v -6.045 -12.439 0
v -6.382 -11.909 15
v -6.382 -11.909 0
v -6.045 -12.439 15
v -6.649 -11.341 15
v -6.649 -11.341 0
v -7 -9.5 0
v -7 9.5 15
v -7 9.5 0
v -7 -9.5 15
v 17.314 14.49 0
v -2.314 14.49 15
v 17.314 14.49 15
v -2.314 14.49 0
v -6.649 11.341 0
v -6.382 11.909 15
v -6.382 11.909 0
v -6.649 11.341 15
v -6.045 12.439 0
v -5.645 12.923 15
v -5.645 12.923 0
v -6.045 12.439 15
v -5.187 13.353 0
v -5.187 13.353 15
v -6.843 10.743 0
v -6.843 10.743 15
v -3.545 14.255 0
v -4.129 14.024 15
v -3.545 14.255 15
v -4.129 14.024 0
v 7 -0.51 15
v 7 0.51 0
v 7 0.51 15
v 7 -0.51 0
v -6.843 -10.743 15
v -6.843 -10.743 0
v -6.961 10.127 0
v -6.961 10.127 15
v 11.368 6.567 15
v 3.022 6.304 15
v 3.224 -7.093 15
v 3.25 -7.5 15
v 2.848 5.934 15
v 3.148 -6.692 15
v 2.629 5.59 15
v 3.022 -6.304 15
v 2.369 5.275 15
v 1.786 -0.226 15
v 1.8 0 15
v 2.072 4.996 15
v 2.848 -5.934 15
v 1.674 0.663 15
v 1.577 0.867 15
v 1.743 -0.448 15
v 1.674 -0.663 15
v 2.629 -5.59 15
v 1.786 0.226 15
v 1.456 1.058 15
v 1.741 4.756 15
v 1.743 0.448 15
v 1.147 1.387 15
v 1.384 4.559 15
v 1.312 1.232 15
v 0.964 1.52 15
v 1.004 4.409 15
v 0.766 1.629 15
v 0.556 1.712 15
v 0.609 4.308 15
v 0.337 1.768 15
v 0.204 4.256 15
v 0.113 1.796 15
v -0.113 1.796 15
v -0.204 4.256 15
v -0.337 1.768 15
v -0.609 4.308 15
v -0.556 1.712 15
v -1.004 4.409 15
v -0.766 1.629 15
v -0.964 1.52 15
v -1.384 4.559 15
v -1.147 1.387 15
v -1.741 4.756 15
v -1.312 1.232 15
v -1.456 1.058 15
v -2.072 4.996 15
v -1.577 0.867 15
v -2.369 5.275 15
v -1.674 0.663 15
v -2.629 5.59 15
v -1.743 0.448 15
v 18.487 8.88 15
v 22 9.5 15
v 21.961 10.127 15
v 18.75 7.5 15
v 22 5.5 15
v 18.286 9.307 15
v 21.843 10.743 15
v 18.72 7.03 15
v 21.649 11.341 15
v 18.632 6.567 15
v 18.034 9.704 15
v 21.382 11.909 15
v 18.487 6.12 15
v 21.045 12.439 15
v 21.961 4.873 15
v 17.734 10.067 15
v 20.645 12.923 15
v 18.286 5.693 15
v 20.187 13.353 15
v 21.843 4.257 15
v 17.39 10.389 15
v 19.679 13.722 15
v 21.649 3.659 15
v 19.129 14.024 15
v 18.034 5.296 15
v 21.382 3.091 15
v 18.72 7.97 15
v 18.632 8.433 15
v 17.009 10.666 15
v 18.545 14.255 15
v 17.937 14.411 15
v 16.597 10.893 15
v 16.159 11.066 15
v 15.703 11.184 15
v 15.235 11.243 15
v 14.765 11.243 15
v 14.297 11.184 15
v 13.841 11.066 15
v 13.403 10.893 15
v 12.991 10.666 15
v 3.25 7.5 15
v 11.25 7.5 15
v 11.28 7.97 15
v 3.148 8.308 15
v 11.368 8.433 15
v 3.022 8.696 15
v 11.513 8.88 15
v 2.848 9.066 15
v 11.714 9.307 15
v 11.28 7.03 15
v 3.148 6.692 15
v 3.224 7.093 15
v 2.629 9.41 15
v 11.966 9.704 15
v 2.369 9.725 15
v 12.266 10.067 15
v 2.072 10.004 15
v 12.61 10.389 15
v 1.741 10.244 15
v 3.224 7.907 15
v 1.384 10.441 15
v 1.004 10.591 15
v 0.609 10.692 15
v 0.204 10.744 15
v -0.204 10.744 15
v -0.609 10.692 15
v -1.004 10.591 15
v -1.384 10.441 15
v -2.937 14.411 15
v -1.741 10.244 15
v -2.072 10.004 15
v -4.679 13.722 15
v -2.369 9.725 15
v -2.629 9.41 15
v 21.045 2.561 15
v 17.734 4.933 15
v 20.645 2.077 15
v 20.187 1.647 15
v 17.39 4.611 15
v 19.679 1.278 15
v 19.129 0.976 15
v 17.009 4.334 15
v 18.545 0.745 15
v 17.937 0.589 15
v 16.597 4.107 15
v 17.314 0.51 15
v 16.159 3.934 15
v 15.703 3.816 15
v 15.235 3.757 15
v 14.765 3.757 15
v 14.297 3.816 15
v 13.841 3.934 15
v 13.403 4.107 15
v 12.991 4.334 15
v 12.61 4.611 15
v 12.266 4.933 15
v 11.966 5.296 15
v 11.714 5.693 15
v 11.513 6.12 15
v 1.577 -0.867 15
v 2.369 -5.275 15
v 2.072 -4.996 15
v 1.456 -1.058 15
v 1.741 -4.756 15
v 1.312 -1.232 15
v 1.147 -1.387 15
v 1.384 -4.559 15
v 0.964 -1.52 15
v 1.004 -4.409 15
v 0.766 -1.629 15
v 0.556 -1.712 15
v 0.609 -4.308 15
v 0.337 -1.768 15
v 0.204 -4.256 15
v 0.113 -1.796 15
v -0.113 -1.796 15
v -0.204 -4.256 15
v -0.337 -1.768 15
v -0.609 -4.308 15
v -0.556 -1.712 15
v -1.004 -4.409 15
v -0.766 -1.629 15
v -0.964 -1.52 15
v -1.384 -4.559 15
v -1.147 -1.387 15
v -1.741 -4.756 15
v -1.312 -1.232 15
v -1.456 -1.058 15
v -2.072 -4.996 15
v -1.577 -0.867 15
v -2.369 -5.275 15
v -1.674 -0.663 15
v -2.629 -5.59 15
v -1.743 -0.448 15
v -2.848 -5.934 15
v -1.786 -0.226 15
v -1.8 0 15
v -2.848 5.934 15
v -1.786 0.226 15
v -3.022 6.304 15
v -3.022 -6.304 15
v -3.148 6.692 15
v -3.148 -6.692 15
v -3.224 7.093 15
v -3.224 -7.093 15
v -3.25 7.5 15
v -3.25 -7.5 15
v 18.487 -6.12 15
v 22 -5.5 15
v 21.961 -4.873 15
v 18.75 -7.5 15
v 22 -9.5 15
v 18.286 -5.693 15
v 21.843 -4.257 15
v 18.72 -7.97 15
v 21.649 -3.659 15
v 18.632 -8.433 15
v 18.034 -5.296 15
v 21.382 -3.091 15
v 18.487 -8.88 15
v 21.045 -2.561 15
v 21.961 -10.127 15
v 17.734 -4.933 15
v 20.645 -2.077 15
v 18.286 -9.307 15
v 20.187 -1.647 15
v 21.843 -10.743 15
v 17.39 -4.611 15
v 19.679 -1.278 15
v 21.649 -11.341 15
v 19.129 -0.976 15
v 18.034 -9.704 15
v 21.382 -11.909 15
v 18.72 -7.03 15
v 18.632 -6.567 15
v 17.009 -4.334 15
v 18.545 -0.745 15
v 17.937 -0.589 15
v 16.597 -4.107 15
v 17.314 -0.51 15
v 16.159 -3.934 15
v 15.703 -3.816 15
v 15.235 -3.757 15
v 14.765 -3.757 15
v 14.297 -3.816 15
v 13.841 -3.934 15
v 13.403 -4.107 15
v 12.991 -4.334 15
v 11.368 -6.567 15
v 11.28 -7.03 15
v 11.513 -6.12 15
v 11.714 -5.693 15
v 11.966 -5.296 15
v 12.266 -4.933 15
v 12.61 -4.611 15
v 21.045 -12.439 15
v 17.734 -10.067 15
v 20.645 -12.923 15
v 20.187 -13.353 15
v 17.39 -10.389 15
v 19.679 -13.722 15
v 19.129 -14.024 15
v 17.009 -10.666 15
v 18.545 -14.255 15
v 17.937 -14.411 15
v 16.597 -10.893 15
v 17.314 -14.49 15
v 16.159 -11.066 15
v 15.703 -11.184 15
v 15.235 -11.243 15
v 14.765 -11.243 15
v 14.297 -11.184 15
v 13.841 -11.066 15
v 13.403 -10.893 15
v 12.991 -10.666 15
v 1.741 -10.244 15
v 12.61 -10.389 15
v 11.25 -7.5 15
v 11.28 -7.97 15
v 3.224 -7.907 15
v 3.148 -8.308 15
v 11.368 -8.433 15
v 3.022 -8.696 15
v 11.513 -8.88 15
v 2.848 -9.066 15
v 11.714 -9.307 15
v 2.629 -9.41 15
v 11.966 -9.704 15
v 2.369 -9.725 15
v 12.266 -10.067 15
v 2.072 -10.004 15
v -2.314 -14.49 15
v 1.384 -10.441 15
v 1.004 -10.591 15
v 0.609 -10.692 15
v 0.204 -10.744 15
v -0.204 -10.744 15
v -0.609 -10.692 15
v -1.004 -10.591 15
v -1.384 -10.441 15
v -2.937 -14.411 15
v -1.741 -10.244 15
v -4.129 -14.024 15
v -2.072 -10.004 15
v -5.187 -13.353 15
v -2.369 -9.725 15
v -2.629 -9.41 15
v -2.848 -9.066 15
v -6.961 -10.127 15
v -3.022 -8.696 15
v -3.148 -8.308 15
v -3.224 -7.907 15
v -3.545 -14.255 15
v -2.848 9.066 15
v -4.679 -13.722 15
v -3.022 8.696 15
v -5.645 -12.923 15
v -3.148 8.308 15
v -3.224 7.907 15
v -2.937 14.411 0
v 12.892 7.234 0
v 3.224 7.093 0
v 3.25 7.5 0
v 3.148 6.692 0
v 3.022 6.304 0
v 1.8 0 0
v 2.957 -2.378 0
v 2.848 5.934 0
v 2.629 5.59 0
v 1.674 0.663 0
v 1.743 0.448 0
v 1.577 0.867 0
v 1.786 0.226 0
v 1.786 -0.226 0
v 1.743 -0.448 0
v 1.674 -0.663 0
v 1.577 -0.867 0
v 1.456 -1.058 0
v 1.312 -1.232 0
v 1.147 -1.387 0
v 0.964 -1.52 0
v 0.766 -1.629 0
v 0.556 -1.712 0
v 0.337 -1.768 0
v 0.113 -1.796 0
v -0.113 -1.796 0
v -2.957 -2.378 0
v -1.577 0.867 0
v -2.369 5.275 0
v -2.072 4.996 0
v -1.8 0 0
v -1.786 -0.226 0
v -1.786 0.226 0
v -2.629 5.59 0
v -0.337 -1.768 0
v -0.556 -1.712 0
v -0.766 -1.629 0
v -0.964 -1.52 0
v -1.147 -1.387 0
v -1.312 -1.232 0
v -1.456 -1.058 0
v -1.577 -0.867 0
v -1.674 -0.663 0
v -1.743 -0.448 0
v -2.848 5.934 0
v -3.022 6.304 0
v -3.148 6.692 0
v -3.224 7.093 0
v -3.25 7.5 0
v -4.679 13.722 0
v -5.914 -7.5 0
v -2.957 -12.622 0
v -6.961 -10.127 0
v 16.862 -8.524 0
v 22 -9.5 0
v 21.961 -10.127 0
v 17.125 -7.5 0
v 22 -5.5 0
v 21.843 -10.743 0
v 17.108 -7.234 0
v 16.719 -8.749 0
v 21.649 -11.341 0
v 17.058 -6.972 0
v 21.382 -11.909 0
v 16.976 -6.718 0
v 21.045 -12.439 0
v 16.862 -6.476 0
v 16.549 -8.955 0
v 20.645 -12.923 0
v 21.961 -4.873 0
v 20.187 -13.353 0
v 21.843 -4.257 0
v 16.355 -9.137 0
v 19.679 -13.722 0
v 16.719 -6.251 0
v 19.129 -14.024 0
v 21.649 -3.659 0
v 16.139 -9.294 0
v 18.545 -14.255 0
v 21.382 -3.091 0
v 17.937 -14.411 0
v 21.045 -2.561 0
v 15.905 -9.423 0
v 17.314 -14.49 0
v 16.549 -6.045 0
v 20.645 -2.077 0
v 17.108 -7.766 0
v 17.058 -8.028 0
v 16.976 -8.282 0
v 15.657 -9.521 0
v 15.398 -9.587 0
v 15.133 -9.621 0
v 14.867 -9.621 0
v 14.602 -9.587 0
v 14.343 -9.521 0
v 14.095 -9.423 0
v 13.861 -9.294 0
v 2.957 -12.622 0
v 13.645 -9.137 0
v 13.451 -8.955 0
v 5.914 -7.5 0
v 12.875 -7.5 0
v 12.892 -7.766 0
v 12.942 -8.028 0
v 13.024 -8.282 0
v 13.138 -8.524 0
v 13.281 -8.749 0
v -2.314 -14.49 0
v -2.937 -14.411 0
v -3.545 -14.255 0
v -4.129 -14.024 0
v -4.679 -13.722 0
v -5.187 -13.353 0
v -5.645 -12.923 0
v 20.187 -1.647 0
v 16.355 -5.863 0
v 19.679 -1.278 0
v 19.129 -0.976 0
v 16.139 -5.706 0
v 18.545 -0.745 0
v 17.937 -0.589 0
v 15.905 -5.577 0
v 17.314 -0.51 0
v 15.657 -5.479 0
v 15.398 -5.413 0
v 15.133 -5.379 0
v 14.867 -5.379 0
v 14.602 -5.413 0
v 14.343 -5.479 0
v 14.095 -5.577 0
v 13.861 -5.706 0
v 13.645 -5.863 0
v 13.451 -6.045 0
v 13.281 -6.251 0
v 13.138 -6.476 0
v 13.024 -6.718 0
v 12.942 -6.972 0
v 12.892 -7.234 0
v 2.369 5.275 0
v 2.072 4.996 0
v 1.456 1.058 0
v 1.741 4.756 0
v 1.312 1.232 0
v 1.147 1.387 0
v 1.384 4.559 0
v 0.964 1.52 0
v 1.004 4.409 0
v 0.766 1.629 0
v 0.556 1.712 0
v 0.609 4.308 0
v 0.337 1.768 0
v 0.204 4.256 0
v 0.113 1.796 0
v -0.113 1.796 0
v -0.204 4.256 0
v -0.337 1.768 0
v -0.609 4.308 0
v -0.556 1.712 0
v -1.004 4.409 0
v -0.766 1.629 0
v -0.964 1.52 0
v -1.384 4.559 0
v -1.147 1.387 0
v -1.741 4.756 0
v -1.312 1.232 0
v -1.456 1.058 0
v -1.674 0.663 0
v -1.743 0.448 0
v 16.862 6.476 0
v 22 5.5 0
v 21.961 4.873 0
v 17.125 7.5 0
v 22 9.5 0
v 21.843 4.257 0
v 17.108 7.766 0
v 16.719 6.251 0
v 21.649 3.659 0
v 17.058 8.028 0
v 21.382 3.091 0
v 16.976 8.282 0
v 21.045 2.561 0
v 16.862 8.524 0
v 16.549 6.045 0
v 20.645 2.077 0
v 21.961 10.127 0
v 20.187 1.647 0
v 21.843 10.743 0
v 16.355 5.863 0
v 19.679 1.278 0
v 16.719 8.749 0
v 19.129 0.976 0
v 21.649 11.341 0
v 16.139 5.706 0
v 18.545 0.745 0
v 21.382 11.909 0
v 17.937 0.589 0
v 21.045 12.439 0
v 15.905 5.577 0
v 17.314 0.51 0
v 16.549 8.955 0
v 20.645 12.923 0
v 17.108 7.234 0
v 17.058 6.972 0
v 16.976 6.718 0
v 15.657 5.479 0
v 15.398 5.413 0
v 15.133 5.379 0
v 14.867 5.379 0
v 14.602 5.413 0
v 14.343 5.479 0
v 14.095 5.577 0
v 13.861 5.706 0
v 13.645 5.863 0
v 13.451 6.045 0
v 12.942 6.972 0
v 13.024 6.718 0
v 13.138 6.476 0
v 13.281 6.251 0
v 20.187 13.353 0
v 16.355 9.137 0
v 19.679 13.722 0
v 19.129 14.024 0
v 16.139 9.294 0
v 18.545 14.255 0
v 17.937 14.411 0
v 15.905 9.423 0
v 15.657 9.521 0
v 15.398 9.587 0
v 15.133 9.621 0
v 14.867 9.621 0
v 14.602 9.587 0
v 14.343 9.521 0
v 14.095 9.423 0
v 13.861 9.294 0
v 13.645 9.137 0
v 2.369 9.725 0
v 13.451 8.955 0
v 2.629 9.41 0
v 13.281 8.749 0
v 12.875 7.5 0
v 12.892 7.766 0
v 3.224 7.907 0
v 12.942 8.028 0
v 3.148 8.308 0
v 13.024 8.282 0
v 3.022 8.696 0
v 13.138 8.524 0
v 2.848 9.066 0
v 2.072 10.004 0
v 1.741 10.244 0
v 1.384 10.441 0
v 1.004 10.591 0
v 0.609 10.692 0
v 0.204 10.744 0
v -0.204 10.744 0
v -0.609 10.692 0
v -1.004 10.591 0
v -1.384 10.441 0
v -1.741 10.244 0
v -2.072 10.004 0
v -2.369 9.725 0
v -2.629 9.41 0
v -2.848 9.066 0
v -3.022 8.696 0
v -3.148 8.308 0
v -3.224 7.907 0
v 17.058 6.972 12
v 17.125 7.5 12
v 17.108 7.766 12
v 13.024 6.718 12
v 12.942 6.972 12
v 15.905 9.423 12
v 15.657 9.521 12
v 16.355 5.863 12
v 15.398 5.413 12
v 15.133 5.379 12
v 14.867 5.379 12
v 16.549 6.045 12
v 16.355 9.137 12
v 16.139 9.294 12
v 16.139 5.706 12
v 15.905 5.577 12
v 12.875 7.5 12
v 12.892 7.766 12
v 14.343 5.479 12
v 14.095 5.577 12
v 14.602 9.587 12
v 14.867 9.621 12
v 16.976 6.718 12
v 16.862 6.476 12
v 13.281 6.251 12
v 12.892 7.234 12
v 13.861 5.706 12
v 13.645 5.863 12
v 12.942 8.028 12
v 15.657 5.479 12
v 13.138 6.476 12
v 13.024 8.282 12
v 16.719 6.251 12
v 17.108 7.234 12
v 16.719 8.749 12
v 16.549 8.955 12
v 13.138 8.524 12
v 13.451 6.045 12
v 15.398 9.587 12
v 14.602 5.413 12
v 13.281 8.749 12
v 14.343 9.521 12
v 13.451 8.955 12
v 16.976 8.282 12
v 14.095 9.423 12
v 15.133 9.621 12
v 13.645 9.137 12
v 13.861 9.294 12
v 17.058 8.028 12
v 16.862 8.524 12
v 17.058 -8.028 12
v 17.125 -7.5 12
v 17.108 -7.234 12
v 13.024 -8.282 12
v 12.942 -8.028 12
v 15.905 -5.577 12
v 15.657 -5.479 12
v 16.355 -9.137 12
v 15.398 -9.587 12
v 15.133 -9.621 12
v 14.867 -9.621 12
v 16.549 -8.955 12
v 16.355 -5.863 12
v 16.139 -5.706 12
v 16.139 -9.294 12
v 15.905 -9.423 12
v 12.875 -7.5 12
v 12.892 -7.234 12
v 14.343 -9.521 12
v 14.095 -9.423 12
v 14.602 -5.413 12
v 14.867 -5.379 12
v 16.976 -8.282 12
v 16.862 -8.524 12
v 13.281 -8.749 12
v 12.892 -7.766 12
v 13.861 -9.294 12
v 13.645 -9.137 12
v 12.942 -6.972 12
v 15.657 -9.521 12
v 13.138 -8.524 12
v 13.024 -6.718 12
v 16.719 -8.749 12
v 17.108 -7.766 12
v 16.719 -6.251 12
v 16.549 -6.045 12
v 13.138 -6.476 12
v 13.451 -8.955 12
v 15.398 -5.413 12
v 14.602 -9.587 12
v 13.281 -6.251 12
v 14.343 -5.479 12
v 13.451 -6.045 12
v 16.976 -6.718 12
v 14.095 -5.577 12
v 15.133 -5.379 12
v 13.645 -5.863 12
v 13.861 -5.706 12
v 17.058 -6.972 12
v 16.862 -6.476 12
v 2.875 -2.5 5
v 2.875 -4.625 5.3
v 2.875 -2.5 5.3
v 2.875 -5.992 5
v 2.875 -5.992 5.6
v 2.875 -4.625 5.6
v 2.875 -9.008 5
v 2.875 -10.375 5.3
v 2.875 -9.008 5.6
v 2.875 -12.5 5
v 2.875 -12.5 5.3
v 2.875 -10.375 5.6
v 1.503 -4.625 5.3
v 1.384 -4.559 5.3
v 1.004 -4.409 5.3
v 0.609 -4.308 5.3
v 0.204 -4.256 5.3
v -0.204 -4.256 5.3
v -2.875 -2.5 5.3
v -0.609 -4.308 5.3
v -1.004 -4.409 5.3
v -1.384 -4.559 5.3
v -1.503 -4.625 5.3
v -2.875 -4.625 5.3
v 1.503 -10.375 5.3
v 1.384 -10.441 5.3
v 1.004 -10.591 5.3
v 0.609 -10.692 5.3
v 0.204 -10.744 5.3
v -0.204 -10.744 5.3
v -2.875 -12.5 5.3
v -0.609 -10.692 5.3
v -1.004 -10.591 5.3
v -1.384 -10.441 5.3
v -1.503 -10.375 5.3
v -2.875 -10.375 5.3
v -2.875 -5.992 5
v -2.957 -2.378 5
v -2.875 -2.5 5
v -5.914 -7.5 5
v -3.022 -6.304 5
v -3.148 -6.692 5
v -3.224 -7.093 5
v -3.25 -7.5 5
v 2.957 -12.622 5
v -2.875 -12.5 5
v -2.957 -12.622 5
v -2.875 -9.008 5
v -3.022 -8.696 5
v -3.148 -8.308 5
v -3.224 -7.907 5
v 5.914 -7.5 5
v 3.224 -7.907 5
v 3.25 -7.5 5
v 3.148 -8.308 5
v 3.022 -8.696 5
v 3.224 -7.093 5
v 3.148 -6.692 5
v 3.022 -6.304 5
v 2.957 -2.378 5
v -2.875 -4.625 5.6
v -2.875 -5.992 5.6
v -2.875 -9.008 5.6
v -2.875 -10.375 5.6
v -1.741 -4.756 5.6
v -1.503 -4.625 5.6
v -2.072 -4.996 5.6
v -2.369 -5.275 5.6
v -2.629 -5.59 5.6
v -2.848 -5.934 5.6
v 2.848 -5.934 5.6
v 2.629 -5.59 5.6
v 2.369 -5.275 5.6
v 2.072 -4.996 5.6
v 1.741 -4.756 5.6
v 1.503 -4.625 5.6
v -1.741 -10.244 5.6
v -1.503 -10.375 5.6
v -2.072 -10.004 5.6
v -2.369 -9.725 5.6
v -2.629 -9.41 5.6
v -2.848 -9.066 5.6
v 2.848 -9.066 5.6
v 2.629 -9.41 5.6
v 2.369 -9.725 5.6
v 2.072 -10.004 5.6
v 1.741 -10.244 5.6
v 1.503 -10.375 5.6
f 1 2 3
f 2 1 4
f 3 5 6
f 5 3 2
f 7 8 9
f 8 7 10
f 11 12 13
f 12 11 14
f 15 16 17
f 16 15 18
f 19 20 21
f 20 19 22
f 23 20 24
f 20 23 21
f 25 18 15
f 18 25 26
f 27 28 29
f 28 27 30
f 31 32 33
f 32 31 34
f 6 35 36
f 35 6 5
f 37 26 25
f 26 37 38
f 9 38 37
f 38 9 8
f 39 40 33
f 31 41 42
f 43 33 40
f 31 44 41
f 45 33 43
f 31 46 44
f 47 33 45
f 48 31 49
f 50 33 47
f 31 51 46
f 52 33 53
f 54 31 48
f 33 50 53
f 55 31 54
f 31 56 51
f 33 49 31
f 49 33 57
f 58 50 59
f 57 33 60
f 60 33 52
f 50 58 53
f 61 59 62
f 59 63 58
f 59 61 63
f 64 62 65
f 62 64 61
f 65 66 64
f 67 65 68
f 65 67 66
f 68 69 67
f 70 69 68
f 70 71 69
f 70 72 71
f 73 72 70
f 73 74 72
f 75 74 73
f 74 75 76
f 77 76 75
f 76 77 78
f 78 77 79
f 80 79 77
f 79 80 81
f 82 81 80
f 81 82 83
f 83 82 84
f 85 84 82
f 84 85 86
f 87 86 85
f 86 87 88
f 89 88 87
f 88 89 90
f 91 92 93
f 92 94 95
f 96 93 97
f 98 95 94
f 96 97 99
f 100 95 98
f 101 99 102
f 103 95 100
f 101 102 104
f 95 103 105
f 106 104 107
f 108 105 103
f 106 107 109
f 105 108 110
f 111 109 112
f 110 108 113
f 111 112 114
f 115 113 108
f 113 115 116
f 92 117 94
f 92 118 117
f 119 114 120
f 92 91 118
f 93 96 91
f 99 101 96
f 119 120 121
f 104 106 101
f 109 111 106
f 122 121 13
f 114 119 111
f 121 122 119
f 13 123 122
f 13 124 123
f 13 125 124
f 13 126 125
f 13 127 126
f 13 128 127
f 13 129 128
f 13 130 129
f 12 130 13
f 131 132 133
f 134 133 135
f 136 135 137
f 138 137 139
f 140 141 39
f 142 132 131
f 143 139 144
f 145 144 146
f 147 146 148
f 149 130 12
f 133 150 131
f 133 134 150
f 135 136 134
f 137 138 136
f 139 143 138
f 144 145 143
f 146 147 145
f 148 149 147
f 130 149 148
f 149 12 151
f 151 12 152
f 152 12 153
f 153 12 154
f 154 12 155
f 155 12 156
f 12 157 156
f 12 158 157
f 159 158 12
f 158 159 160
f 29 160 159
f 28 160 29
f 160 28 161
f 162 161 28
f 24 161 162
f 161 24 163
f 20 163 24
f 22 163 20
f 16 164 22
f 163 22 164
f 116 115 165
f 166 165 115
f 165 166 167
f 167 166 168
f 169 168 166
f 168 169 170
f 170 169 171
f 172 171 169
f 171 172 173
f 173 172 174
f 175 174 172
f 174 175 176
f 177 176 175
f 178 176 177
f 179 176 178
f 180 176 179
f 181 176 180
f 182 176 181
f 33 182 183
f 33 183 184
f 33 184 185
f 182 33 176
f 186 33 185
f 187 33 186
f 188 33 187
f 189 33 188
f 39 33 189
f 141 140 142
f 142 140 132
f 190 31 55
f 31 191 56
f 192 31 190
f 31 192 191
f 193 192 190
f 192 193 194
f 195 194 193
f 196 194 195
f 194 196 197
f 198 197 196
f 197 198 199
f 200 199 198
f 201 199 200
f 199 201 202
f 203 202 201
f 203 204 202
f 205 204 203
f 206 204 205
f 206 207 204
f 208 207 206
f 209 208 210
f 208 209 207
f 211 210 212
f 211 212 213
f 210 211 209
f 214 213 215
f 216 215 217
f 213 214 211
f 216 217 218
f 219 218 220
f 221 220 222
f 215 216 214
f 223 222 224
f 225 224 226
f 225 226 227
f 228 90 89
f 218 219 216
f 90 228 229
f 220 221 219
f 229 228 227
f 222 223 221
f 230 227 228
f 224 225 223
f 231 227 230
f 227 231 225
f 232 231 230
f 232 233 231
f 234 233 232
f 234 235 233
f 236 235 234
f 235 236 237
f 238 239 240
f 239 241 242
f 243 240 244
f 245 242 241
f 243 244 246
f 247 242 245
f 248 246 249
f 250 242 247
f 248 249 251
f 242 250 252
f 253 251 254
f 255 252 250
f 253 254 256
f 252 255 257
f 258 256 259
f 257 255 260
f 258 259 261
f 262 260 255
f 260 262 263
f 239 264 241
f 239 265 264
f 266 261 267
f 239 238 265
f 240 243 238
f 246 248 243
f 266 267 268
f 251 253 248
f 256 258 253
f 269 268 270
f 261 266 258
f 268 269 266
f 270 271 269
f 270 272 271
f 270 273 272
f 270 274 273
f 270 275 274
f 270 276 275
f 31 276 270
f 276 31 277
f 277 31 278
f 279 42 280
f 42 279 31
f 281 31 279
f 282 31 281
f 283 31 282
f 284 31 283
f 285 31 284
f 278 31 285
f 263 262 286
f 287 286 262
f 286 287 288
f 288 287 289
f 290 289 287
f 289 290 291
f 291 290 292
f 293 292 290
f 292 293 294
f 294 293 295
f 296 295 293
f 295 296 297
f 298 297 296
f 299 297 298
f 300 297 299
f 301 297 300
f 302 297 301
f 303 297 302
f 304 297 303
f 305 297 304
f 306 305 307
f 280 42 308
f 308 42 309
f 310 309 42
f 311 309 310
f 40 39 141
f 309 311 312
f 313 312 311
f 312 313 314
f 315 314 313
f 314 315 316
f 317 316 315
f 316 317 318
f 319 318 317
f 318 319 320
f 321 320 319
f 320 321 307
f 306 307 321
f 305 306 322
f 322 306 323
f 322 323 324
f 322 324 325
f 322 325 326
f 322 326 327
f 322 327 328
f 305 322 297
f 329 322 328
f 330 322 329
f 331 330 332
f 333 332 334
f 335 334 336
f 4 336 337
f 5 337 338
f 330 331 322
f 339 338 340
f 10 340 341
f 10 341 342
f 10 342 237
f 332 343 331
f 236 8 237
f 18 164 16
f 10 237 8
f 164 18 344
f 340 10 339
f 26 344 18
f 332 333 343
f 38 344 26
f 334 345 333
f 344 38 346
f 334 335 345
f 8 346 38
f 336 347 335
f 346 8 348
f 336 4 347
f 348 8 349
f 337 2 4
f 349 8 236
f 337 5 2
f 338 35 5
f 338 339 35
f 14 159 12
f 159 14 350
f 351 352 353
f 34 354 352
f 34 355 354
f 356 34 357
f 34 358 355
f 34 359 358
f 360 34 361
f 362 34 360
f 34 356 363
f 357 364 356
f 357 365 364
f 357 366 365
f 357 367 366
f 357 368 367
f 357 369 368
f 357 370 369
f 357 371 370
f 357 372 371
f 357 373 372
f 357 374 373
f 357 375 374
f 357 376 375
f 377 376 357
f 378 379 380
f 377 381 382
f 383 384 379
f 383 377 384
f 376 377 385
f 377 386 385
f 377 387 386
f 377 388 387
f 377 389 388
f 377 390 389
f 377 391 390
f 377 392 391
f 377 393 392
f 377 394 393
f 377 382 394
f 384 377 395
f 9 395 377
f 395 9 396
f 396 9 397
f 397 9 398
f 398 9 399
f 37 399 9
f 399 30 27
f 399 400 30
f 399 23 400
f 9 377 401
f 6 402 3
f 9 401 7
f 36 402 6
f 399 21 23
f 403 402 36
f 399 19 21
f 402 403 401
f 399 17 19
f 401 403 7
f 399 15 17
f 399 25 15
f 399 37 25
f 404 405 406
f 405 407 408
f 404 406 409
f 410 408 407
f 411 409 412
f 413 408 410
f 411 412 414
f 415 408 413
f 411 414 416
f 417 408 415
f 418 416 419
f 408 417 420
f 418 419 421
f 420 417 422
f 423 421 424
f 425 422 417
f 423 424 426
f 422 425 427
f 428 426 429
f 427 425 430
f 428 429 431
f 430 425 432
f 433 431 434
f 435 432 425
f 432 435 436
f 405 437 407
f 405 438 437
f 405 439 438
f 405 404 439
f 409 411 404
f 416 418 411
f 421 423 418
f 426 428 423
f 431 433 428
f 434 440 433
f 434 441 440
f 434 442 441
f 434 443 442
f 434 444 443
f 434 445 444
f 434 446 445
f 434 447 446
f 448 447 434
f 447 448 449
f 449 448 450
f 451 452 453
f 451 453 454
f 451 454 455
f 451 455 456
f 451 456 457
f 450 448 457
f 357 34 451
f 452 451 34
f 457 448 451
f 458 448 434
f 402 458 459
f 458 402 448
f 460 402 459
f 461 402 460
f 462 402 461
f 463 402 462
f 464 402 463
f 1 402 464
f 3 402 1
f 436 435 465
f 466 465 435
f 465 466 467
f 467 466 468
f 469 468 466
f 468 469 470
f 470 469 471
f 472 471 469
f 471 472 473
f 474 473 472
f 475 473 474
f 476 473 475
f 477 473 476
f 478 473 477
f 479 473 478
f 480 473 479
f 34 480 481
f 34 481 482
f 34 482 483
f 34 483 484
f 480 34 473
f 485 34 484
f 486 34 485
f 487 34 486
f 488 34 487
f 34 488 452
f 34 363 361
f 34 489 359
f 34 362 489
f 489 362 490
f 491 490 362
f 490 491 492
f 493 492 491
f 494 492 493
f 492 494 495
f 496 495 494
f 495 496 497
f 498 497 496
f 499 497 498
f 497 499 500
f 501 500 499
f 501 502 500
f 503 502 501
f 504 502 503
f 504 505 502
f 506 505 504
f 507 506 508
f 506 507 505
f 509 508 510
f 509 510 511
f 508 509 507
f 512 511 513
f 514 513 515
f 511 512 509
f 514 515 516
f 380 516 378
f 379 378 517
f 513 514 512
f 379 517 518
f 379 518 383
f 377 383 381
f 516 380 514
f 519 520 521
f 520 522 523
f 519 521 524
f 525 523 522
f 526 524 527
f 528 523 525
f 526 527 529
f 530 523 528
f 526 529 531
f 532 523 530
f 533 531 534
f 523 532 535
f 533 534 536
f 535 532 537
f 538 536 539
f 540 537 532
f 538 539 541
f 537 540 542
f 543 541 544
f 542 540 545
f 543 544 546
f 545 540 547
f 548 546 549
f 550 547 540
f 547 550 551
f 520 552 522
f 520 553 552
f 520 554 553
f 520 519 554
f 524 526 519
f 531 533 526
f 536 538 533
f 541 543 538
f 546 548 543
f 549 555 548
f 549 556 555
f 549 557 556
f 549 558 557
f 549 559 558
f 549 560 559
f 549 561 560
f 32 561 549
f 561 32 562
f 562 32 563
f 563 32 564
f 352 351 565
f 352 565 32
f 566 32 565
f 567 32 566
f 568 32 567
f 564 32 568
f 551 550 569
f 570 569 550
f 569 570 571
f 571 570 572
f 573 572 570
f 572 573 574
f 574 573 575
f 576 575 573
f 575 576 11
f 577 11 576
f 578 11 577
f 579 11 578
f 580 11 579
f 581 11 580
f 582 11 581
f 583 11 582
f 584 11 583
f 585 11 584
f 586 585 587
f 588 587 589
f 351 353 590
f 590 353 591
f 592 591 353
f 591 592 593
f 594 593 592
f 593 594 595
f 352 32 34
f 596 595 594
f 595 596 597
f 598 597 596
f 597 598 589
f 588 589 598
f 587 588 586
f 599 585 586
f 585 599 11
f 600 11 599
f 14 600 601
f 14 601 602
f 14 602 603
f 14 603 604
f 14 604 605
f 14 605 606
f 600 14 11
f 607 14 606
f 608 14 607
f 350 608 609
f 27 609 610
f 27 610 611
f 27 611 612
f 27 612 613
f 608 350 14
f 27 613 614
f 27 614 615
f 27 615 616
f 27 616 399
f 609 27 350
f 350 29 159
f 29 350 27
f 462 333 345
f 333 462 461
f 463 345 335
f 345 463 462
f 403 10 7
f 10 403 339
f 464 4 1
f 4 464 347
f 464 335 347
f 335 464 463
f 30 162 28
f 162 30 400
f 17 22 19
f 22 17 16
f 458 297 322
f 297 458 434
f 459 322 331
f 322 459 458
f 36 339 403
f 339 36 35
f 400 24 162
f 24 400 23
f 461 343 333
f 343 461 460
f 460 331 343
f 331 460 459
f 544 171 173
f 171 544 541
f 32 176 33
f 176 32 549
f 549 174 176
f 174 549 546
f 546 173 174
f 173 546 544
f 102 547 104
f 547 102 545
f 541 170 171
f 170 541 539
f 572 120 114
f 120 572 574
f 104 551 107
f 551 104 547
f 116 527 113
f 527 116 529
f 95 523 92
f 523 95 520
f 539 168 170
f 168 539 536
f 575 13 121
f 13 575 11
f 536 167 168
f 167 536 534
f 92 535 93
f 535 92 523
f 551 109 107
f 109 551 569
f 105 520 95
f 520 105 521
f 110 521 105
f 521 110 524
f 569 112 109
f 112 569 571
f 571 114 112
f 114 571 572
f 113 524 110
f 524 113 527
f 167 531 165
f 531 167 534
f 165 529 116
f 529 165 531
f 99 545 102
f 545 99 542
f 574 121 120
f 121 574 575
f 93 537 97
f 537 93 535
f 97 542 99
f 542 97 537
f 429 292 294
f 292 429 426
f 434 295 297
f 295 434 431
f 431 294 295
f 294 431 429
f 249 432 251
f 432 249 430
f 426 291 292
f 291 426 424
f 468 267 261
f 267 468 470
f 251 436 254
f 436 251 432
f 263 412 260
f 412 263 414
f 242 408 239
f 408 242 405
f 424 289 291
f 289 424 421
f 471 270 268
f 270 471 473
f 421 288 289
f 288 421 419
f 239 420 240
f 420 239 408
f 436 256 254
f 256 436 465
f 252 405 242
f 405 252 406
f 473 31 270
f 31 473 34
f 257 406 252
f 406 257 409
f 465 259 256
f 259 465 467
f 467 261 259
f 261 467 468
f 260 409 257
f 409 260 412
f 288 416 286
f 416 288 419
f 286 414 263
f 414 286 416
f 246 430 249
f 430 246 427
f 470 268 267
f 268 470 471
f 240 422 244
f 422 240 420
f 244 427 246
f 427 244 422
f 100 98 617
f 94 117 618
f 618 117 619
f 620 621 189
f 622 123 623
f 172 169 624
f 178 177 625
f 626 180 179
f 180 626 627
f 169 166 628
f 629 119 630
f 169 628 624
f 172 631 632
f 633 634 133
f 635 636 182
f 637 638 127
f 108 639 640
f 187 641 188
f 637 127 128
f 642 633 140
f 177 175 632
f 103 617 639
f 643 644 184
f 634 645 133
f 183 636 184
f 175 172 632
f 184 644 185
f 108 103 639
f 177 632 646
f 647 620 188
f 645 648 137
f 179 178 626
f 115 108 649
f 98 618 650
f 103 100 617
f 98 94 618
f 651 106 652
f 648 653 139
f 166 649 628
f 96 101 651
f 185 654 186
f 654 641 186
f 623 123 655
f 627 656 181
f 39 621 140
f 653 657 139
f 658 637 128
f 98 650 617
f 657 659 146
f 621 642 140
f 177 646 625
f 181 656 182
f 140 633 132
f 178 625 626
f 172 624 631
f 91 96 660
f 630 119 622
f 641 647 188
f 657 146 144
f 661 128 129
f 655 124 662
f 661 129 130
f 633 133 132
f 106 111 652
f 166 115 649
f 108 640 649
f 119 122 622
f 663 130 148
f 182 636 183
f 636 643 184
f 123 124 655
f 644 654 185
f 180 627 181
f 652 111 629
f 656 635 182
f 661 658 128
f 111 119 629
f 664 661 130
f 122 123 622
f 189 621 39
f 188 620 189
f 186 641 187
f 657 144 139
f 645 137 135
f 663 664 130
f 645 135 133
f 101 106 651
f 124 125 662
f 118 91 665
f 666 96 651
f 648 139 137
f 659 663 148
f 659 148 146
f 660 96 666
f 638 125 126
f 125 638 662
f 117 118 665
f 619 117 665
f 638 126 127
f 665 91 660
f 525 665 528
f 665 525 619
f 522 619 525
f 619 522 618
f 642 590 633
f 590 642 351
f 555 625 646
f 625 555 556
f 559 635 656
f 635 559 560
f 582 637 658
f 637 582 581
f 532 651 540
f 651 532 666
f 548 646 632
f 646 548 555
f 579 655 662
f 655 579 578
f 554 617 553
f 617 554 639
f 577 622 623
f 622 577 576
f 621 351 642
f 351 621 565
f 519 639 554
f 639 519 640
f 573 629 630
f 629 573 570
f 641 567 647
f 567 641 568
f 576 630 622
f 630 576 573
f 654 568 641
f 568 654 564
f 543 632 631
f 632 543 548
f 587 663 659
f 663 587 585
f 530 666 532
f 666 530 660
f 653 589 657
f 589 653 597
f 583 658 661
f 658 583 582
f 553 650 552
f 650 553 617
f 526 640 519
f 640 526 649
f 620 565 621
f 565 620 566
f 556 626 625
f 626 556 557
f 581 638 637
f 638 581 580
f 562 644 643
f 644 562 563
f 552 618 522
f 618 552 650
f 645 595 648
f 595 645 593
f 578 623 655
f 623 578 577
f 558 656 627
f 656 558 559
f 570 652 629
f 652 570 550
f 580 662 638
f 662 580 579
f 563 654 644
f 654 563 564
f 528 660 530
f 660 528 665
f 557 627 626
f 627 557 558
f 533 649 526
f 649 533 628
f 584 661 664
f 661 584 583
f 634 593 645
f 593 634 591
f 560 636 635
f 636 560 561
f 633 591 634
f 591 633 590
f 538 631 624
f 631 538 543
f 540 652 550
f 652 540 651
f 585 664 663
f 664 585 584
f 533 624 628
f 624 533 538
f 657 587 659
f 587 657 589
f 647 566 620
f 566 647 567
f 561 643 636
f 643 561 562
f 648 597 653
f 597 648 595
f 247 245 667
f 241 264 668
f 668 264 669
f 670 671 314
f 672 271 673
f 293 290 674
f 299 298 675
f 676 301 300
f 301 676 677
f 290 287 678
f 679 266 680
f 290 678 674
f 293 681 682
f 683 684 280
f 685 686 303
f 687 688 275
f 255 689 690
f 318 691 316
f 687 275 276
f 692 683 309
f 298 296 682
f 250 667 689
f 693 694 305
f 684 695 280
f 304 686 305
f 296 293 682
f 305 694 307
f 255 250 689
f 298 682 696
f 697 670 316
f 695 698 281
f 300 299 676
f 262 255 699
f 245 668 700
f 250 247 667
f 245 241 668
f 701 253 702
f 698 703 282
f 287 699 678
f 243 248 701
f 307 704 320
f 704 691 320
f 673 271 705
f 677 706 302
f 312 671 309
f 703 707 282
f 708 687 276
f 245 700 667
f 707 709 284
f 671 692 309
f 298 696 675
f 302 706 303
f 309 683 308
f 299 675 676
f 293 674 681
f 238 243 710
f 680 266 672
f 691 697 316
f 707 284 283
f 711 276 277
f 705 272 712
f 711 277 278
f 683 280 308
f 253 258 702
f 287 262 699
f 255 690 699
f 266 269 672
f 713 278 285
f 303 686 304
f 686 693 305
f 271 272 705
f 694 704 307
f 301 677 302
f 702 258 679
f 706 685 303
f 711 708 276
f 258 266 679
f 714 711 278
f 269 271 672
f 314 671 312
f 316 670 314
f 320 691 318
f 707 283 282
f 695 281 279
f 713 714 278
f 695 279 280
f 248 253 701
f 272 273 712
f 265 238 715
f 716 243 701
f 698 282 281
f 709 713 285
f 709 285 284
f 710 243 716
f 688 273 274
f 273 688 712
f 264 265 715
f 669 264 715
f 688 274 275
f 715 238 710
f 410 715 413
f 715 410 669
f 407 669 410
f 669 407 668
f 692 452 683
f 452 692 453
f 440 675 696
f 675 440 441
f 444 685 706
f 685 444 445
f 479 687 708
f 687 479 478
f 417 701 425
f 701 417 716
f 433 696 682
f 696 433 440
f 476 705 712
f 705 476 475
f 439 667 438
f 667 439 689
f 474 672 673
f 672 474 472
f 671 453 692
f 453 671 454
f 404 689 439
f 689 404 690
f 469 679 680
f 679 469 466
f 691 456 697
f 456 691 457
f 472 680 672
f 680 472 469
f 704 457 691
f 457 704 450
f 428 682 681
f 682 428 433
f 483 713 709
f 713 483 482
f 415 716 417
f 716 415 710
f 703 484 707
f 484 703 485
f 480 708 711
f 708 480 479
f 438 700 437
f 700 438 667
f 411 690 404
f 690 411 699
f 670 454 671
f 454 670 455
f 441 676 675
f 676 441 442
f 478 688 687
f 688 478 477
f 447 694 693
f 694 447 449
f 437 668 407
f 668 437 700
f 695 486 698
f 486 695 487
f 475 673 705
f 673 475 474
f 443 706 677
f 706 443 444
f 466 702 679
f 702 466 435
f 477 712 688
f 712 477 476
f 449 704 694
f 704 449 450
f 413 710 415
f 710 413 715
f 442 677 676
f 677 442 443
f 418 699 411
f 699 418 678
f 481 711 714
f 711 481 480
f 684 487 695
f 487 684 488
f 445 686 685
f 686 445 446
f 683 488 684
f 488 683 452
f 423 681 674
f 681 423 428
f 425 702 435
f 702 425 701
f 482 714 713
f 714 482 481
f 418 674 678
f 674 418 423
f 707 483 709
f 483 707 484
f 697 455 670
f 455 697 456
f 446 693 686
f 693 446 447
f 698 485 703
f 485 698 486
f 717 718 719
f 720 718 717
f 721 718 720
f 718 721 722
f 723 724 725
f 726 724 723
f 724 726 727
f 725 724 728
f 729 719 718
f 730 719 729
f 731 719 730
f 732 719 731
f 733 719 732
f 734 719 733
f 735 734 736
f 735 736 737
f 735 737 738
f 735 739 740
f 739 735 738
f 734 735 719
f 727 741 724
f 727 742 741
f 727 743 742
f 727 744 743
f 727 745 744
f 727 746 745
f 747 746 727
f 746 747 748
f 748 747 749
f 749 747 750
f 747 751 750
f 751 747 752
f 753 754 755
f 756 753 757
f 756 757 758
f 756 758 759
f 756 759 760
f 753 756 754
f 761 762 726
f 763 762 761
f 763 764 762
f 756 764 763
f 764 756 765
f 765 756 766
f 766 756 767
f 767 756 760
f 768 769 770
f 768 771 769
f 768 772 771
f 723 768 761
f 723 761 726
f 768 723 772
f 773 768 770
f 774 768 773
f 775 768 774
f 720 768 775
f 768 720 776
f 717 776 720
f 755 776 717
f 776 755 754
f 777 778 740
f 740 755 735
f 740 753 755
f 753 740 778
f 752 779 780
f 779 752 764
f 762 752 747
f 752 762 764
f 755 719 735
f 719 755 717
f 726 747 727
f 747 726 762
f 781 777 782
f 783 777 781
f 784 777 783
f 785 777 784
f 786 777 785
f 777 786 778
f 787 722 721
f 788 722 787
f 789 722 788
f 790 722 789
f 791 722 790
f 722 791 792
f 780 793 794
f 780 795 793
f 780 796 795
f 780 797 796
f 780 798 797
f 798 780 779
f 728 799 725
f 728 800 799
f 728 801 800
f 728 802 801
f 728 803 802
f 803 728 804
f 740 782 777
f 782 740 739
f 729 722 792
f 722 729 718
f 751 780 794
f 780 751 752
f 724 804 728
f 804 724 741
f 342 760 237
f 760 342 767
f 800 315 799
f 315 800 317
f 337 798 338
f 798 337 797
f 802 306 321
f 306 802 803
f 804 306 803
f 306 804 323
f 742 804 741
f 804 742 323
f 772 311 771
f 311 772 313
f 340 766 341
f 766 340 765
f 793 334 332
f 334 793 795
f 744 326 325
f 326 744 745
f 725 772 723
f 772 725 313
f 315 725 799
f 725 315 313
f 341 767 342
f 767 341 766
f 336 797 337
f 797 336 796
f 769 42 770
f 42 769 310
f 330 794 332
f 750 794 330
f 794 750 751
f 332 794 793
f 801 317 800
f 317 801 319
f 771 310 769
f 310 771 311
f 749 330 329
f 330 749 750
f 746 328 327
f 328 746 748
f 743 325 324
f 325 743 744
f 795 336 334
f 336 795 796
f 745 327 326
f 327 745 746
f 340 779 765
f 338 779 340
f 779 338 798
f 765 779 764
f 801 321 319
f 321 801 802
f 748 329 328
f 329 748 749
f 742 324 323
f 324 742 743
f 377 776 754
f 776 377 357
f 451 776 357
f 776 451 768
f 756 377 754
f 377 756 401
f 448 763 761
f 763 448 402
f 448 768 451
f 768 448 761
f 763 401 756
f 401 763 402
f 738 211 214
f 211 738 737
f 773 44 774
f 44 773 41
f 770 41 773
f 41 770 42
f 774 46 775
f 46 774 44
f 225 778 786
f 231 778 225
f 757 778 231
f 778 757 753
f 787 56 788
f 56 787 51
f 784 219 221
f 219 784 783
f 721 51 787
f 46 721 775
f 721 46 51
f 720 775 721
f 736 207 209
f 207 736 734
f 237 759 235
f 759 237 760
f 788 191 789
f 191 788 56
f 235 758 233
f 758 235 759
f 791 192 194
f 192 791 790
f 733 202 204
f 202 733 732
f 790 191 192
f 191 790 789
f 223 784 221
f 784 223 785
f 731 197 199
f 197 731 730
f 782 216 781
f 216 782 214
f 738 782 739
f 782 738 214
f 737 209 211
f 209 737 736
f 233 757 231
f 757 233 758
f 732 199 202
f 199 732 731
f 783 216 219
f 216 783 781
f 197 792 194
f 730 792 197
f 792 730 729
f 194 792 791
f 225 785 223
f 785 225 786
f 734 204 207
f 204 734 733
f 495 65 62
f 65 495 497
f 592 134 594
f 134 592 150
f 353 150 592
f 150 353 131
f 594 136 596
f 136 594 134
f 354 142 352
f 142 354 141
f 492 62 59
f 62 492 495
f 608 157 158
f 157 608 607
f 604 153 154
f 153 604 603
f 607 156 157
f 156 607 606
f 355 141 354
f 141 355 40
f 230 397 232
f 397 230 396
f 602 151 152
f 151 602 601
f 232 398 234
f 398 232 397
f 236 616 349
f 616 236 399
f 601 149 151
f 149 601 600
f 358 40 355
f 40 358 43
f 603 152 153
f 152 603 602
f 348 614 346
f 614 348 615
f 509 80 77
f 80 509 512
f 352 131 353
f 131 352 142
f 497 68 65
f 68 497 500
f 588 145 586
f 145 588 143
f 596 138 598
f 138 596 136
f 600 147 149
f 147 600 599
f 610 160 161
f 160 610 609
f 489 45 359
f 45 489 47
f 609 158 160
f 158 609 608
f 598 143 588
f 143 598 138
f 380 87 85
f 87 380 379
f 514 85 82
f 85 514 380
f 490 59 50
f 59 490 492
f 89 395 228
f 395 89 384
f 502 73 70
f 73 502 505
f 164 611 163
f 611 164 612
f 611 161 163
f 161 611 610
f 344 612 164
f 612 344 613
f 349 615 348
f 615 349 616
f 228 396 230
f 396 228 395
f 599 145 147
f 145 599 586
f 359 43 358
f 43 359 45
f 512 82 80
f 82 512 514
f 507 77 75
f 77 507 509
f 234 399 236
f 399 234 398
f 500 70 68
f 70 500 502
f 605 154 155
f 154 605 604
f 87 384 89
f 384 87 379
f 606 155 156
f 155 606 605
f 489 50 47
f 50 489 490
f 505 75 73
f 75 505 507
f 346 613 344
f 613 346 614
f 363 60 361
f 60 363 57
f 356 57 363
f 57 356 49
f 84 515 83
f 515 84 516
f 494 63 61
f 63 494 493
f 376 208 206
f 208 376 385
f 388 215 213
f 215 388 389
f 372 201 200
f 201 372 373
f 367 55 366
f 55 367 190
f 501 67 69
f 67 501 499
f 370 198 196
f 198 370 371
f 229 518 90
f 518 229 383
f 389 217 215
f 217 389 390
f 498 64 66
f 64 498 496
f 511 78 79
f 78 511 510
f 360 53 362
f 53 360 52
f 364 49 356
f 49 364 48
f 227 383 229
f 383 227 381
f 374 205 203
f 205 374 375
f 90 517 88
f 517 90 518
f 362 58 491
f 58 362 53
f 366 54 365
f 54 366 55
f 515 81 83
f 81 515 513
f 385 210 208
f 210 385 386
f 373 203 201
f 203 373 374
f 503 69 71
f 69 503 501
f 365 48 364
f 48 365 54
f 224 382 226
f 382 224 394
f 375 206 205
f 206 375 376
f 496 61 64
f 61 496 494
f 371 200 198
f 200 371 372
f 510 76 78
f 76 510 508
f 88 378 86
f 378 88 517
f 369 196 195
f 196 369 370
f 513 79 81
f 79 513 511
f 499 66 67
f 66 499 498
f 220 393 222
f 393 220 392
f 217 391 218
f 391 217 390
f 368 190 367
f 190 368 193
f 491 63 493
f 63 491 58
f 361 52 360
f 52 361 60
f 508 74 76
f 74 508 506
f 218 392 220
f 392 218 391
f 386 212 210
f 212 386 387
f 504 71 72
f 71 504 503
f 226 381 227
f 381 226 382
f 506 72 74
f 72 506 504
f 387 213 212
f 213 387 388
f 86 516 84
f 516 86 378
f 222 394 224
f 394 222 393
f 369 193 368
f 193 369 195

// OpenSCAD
$fn = 50;


difference() {
	union() {
		hull() {
			translate(v = [-2.0000000000, 9.5000000000, 0]) {
				cylinder(h = 15, r = 5);
			}
			translate(v = [2.0000000000, 9.5000000000, 0]) {
				cylinder(h = 15, r = 5);
			}
			translate(v = [-2.0000000000, -9.5000000000, 0]) {
				cylinder(h = 15, r = 5);
			}
			translate(v = [2.0000000000, -9.5000000000, 0]) {
				cylinder(h = 15, r = 5);
			}
		}
		translate(v = [7.5000000000, 7.5000000000, 0]) {
			hull() {
				translate(v = [-9.5000000000, 2.0000000000, 0]) {
					cylinder(h = 15, r = 5);
				}
				translate(v = [9.5000000000, 2.0000000000, 0]) {
					cylinder(h = 15, r = 5);
				}
				translate(v = [-9.5000000000, -2.0000000000, 0]) {
					cylinder(h = 15, r = 5);
				}
				translate(v = [9.5000000000, -2.0000000000, 0]) {
					cylinder(h = 15, r = 5);
				}
			}
		}
		translate(v = [7.5000000000, -7.5000000000, 0]) {
			hull() {
				translate(v = [-9.5000000000, 2.0000000000, 0]) {
					cylinder(h = 15, r = 5);
				}
				translate(v = [9.5000000000, 2.0000000000, 0]) {
					cylinder(h = 15, r = 5);
				}
				translate(v = [-9.5000000000, -2.0000000000, 0]) {
					cylinder(h = 15, r = 5);
				}
				translate(v = [9.5000000000, -2.0000000000, 0]) {
					cylinder(h = 15, r = 5);
				}
			}
		}
	}
	union() {
		translate(v = [15.0000000000, 7.5000000000, 15]) {
			rotate(a = [0, 0, 0]) {
				difference() {
					union() {
						#translate(v = [0, 0, -15.0000000000]) {
							cylinder(h = 15, r = 2.0000000000);
						}
						#translate(v = [0, 0, -3]) {
							cylinder(h = 3, r1 = 2.1250000000, r2 = 3.7500000000);
						}
						#translate(v = [0, 0, -15.0000000000]) {
							cylinder(h = 15, r = 2.1250000000);
						}
						#translate(v = [0, 0, -15.0000000000]) {
							cylinder(h = 15, r = 2.0000000000);
						}
					}
					union();
				}
			}
		}
		translate(v = [15.0000000000, -7.5000000000, 15]) {
			rotate(a = [0, 0, 0]) {
				difference() {
					union() {
						#translate(v = [0, 0, -15.0000000000]) {
							cylinder(h = 15, r = 2.0000000000);
						}
						#translate(v = [0, 0, -3]) {
							cylinder(h = 3, r1 = 2.1250000000, r2 = 3.7500000000);
						}
						#translate(v = [0, 0, -15.0000000000]) {
							cylinder(h = 15, r = 2.1250000000);
						}
						#translate(v = [0, 0, -15.0000000000]) {
							cylinder(h = 15, r = 2.0000000000);
						}
					}
					union();
				}
			}
		}
		translate(v = [0.0000000000, -7.5000000000, 0]) {
			rotate(a = [0, 0, 0]) {
				difference() {
					union() {
						#translate(v = [-2.8750000000, -5.0000000000, -0.3000000000]) {
							cube(size = [5.7500000000, 10, 0.3000000000]);
						}
						#translate(v = [-2.8750000000, -2.8750000000, -0.6000000000]) {
							cube(size = [5.7500000000, 5.7500000000, 0.3000000000]);
						}
						#translate(v = [-2.8750000000, -5.0000000000, 5]) {
							cube(size = [5.7500000000, 10, 0.3000000000]);
						}
						#translate(v = [-2.8750000000, -2.8750000000, 5.3000000000]) {
							cube(size = [5.7500000000, 5.7500000000, 0.3000000000]);
						}
						#translate(v = [0, 0, -100.0000000000]) {
							cylinder(h = 200, r = 3.2500000000);
						}
						#linear_extrude(height = 5) {
							polygon(points = [[5.9142500000, 0.0000000000], [2.9571250000, 5.1218907443], [-2.9571250000, 5.1218907443], [-5.9142500000, 0.0000000000], [-2.9571250000, -5.1218907443], [2.9571250000, -5.1218907443]]);
						}
						#translate(v = [-2.8750000000, -5.0000000000, -0.3000000000]) {
							cube(size = [5.7500000000, 10, 0.3000000000]);
						}
						#translate(v = [-2.8750000000, -2.8750000000, -0.6000000000]) {
							cube(size = [5.7500000000, 5.7500000000, 0.3000000000]);
						}
						#translate(v = [-2.8750000000, -5.0000000000, 5]) {
							cube(size = [5.7500000000, 10, 0.3000000000]);
						}
						#translate(v = [-2.8750000000, -2.8750000000, 5.3000000000]) {
							cube(size = [5.7500000000, 5.7500000000, 0.3000000000]);
						}
						#translate(v = [0, 0, -100.0000000000]) {
							cylinder(h = 200, r = 3.2500000000);
						}
						#translate(v = [-2.8750000000, -5.0000000000, -0.3000000000]) {
							cube(size = [5.7500000000, 10, 0.3000000000]);
						}
						#translate(v = [-2.8750000000, -2.8750000000, -0.6000000000]) {
							cube(size = [5.7500000000, 5.7500000000, 0.3000000000]);
						}
						#translate(v = [-2.8750000000, -5.0000000000, 5]) {
							cube(size = [5.7500000000, 10, 0.3000000000]);
						}
						#translate(v = [-2.8750000000, -2.8750000000, 5.3000000000]) {
							cube(size = [5.7500000000, 5.7500000000, 0.3000000000]);
						}
						#translate(v = [0, 0, -100.0000000000]) {
							cylinder(h = 200, r = 3.2500000000);
						}
					}
					union();
				}
			}
		}
		translate(v = [0.0000000000, -7.5000000000, 0]) {
			translate(v = [0, 0, -100]) {
				cylinder(h = 200, r = 3.2500000000);
			}
		}
		translate(v = [0.0000000000, 7.5000000000, 0]) {
			translate(v = [0, 0, -100]) {
				cylinder(h = 200, r = 3.2500000000);
			}
		}
		translate(v = [0.0000000000, -7.5000000000, 0]) {
			translate(v = [0, 0, -100]) {
				cylinder(h = 200, r = 1.8000000000);
			}
		}
		translate(v = [0, 0, -100]) {
			cylinder(h = 200, r = 1.8000000000);
		}
		translate(v = [0.0000000000, 7.5000000000, 0]) {
			translate(v = [0, 0, -100]) {
				cylinder(h = 200, r = 1.8000000000);
			}
		}
	}
}
